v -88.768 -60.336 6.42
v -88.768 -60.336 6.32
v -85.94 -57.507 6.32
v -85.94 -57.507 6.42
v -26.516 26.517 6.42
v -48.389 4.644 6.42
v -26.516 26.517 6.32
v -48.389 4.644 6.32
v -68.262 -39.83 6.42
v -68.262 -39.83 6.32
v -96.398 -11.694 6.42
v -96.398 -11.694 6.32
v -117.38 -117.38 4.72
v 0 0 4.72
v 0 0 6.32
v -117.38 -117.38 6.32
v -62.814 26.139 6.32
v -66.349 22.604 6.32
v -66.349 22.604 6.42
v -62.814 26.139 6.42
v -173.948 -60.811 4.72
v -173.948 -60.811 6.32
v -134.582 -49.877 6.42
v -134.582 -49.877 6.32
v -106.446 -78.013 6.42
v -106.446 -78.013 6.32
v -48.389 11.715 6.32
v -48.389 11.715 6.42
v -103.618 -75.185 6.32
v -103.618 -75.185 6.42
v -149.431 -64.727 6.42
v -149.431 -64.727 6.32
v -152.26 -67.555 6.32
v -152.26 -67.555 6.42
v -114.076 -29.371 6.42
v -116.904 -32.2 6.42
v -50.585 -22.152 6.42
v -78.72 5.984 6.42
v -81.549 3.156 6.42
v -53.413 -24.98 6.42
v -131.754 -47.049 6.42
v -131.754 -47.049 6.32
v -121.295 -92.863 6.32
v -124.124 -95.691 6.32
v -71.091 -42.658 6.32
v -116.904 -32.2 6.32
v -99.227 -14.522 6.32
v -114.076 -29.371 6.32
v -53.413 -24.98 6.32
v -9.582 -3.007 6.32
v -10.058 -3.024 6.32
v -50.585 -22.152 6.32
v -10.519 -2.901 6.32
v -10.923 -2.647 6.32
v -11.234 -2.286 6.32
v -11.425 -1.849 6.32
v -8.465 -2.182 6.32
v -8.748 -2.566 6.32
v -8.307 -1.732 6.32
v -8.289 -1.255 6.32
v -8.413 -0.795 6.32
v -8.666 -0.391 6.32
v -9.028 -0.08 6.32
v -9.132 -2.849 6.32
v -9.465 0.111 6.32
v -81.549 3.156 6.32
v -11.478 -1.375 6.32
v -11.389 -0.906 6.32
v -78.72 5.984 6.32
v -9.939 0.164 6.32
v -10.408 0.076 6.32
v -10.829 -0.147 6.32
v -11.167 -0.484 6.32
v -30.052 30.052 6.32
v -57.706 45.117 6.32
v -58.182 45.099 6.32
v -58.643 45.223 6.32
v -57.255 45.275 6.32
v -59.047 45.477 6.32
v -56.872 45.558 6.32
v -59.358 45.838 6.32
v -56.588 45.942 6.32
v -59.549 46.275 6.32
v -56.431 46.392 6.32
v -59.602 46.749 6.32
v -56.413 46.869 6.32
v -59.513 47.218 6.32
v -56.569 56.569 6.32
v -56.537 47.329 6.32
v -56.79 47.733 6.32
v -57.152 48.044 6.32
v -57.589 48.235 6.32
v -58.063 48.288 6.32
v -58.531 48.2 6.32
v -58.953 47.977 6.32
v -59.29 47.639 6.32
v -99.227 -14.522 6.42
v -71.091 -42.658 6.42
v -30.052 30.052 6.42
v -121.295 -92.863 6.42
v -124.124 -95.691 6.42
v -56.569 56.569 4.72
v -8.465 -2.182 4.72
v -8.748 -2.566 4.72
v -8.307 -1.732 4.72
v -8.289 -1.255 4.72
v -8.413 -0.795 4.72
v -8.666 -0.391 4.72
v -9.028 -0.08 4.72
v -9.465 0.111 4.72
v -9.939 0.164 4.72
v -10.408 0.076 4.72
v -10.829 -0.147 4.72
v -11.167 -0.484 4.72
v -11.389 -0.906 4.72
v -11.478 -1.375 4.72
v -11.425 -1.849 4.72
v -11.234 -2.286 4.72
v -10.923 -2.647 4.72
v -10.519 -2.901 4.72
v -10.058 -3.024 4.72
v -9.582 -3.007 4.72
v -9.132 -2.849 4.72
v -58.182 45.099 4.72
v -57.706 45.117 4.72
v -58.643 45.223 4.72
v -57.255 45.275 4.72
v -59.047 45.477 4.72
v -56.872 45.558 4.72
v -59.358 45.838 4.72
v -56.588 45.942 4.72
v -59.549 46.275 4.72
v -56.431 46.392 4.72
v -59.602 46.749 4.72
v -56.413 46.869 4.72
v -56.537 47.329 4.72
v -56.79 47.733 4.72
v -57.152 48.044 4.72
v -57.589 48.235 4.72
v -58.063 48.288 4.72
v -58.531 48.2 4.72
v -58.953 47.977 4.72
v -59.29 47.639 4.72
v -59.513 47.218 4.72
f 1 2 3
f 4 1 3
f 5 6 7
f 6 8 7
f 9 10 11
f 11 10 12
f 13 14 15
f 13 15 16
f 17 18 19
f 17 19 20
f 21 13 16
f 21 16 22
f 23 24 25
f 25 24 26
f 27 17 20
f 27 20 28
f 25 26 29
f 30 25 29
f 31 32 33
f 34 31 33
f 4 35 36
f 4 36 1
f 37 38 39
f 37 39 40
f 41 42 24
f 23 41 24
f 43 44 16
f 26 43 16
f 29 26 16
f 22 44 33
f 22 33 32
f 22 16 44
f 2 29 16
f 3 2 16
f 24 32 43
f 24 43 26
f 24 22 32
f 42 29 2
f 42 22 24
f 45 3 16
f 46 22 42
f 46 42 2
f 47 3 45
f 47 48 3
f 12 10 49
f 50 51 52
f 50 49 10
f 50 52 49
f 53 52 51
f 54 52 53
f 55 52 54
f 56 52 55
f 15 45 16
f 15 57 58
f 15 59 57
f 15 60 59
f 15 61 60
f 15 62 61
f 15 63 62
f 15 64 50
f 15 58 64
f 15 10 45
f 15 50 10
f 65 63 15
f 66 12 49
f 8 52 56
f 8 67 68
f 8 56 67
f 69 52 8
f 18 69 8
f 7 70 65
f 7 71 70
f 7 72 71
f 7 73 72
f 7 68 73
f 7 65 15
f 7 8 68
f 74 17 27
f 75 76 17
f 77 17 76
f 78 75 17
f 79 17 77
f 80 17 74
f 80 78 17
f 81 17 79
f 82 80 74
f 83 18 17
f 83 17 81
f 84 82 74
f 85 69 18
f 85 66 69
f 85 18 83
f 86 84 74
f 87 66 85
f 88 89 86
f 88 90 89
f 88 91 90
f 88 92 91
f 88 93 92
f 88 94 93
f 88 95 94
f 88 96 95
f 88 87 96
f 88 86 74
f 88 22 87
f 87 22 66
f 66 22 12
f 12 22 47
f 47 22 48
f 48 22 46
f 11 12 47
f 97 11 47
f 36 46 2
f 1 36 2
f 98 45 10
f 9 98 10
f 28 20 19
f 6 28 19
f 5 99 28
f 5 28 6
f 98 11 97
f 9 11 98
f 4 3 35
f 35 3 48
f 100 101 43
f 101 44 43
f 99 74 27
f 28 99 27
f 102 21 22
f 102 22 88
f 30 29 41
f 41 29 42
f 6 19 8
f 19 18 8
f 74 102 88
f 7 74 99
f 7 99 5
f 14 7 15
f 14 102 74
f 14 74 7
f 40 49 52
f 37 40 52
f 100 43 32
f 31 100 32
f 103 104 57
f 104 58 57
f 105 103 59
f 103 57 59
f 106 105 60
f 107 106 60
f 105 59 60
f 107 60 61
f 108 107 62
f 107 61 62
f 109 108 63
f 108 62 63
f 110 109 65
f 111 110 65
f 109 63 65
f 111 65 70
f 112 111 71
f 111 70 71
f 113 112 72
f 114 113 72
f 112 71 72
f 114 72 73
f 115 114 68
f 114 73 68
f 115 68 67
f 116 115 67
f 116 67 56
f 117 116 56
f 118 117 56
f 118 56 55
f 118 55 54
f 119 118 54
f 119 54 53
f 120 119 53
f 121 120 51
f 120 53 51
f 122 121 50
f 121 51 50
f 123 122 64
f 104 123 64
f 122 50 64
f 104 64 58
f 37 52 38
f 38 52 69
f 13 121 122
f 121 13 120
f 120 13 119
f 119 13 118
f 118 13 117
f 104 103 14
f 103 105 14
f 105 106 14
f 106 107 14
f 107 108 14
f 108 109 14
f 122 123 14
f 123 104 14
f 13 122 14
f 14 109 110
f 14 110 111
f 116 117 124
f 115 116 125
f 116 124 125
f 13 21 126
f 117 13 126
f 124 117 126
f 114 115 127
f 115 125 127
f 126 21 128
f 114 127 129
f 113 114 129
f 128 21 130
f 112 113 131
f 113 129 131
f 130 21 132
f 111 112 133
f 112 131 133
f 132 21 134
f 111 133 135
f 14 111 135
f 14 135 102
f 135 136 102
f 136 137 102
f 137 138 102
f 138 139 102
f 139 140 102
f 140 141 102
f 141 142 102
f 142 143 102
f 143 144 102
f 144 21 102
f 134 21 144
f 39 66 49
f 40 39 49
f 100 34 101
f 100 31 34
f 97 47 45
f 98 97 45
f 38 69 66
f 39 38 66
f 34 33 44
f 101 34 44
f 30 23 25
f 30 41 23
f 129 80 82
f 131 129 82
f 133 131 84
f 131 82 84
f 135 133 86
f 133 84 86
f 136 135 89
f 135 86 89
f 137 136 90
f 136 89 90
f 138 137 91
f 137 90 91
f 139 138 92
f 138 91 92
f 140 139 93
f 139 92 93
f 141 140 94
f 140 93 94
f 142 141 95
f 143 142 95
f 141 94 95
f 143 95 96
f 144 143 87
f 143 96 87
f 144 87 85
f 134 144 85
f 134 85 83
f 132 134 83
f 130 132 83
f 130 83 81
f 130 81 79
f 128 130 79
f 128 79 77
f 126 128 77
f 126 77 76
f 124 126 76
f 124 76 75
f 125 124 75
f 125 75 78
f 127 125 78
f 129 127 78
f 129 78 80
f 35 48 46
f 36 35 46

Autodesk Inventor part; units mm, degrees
ref_plane "YZ Plane" through (0, 0, 0) normal (1, 0, 0) x (0, 1, 0)
ref_plane "XZ Plane" through (0, 0, 0) normal (0, 1, 0) x (-1, 0, 0)
ref_plane "XY Plane" through (0, 0, 0) normal (0, 0, 1) x (1, 0, 0)
ref_plane "Work Plane1" through (25.4381, 4.2054, 4.72) normal (0, 0, 1) x (0.7071, 0.7071, 0)
sketch "Sketch1" plane through (25.4381, 4.2054, 4.72) normal (0, 0, 1) x (0.7071, 0.7071, 0)
  line L0 (-20.9611, 15.0138) -> (-186.9611, 15.0138)
  line L1 (-186.9611, 15.0138) -> (-186.9611, 95.0138)
  line L2 (-186.9611, 95.0138) -> (-20.9611, 95.0138)
  line L3 (-20.9611, 95.0138) -> (-20.9611, 15.0138)
  dimension "d0" = 166
  dimension "d1" = 80
extrude "Extrusion1" add sketch "Sketch1" along normal blind 1.6
sketch "Sketch2" plane through (25.4381, 4.2054, 6.32) normal (0, 0, 1) x (0.7071, 0.7071, 0)
  point P0 (-20.9611, 15.0138)
sketch "Sketch3" plane through (25.4381, 4.2054, 6.32) normal (0, 0, 1) x (0.7071, -0.7071, 0)
  circle A0 centre (-103.5277, -22.9611) radius 1.6 projected
  circle A1 centre (-89.0425, -28.9611) radius 1.6 projected
  circle A2 centre (-20.9851, -28.9611) radius 1.6 projected
  point P0 (-15.0138, -20.9611)
ref_plane "Work Plane2" through (-28.2843, 28.2843, 4.72) normal (0.7071, -0.7071, 0) x (0, 0, 1)
extrude "Extrusion2" cut sketch "Sketch3" against normal blind 10 contours A1 | A2
sketch "Sketch4" plane through (25.4381, 4.2054, 6.32) normal (0, 0, 1) x (0.7071, -0.7071, 0)
  line L0 (-15.0138, -20.9611) -> (-95.0138, -20.9611) projected
  line L1 (-55.0138, -20.9611) -> (-55.0138, -186.9611) construction
  line L2 (-95.0138, -186.9611) -> (-15.0138, -186.9611) projected
  line L3 (-57.5138, -51.8936) -> (-52.5138, -51.8936)
  line L4 (-52.5138, -51.8936) -> (-52.5138, -20.9611)
  line L5 (-52.5138, -20.9611) -> (-57.5138, -20.9611)
  line L6 (-57.5138, -20.9611) -> (-57.5138, -51.8936)
  line L7 (-57.5138, -51.8936) -> (-52.5138, -20.9611) construction
  line L8 (-52.5138, -51.8936) -> (-57.5138, -20.9611) construction
  line L9 (-52.5138, -51.8936) -> (-77.9131, -51.8936)
  line L10 (-77.9131, -51.8936) -> (-77.9131, -46.8936)
  line L11 (-77.9131, -46.8936) -> (-52.5138, -46.8936)
  line L12 (-52.5138, -46.8936) -> (-52.5138, -51.8936)
  line L13 (-74.9089, -76.3936) -> (-35.1187, -76.3936)
  line L14 (-35.1187, -76.3936) -> (-35.1187, -72.3936)
  line L15 (-35.1187, -72.3936) -> (-74.9089, -72.3936)
  line L16 (-74.9089, -72.3936) -> (-74.9089, -76.3936)
  line L17 (-74.9089, -76.3936) -> (-35.1187, -72.3936) construction
  line L18 (-35.1187, -76.3936) -> (-74.9089, -72.3936) construction
  line L19 (-35.1187, -97.3936) -> (-74.9089, -97.3936)
  line L20 (-74.9089, -101.3936) -> (-35.1187, -97.3936) construction
  line L21 (-74.9089, -101.3936) -> (-35.1187, -101.3936)
  line L22 (-35.1187, -101.3936) -> (-74.9089, -97.3936) construction
  line L23 (-74.9089, -97.3936) -> (-74.9089, -101.3936)
  line L24 (-35.1187, -101.3936) -> (-35.1187, -97.3936)
  line L25 (-35.1187, -122.3936) -> (-74.9089, -122.3936)
  line L26 (-74.9089, -126.3936) -> (-35.1187, -122.3936) construction
  line L27 (-74.9089, -126.3936) -> (-35.1187, -126.3936)
  line L28 (-35.1187, -126.3936) -> (-74.9089, -122.3936) construction
  line L29 (-74.9089, -122.3936) -> (-74.9089, -126.3936)
  line L30 (-35.1187, -126.3936) -> (-35.1187, -122.3936)
  line L31 (-35.1187, -147.3936) -> (-74.9089, -147.3936)
  line L32 (-74.9089, -151.3936) -> (-35.1187, -147.3936) construction
  line L33 (-74.9089, -151.3936) -> (-35.1187, -151.3936)
  line L34 (-35.1187, -151.3936) -> (-74.9089, -147.3936) construction
  line L35 (-74.9089, -147.3936) -> (-74.9089, -151.3936)
  line L36 (-35.1187, -151.3936) -> (-35.1187, -147.3936)
  line L37 (-35.1187, -172.3936) -> (-74.9089, -172.3936)
  line L38 (-74.9089, -176.3936) -> (-35.1187, -172.3936) construction
  line L39 (-74.9089, -176.3936) -> (-35.1187, -176.3936)
  line L40 (-35.1187, -176.3936) -> (-74.9089, -172.3936) construction
  line L41 (-74.9089, -172.3936) -> (-74.9089, -176.3936)
  line L42 (-35.1187, -176.3936) -> (-35.1187, -172.3936)
  point P0 (-55.0138, -36.4274)
  point P1 (-55.0138, -74.3936)
  point P2 (-52.5138, -49.3936)
  point P3 (-55.0138, -99.3936)
  point P4 (-55.0138, -124.3936)
  point P5 (-55.0138, -149.3936)
  point P6 (-55.0138, -174.3936)
  point P7 (-57.5138, -51.8936)
  point P8 (-57.5138, -20.9611)
  point P9 (-57.5138, -46.8936)
  dimension "d7" = 5
  dimension "d8" = 5
  dimension "d9" = 4
  dimension "d10" = 25
  dimension "d13" = 25
extrude "Extrusion3" add sketch "Sketch4" along normal blind 0.1
equation "\"d13\" = d10"
properties part number "Antenna" material "Polystyrene"
